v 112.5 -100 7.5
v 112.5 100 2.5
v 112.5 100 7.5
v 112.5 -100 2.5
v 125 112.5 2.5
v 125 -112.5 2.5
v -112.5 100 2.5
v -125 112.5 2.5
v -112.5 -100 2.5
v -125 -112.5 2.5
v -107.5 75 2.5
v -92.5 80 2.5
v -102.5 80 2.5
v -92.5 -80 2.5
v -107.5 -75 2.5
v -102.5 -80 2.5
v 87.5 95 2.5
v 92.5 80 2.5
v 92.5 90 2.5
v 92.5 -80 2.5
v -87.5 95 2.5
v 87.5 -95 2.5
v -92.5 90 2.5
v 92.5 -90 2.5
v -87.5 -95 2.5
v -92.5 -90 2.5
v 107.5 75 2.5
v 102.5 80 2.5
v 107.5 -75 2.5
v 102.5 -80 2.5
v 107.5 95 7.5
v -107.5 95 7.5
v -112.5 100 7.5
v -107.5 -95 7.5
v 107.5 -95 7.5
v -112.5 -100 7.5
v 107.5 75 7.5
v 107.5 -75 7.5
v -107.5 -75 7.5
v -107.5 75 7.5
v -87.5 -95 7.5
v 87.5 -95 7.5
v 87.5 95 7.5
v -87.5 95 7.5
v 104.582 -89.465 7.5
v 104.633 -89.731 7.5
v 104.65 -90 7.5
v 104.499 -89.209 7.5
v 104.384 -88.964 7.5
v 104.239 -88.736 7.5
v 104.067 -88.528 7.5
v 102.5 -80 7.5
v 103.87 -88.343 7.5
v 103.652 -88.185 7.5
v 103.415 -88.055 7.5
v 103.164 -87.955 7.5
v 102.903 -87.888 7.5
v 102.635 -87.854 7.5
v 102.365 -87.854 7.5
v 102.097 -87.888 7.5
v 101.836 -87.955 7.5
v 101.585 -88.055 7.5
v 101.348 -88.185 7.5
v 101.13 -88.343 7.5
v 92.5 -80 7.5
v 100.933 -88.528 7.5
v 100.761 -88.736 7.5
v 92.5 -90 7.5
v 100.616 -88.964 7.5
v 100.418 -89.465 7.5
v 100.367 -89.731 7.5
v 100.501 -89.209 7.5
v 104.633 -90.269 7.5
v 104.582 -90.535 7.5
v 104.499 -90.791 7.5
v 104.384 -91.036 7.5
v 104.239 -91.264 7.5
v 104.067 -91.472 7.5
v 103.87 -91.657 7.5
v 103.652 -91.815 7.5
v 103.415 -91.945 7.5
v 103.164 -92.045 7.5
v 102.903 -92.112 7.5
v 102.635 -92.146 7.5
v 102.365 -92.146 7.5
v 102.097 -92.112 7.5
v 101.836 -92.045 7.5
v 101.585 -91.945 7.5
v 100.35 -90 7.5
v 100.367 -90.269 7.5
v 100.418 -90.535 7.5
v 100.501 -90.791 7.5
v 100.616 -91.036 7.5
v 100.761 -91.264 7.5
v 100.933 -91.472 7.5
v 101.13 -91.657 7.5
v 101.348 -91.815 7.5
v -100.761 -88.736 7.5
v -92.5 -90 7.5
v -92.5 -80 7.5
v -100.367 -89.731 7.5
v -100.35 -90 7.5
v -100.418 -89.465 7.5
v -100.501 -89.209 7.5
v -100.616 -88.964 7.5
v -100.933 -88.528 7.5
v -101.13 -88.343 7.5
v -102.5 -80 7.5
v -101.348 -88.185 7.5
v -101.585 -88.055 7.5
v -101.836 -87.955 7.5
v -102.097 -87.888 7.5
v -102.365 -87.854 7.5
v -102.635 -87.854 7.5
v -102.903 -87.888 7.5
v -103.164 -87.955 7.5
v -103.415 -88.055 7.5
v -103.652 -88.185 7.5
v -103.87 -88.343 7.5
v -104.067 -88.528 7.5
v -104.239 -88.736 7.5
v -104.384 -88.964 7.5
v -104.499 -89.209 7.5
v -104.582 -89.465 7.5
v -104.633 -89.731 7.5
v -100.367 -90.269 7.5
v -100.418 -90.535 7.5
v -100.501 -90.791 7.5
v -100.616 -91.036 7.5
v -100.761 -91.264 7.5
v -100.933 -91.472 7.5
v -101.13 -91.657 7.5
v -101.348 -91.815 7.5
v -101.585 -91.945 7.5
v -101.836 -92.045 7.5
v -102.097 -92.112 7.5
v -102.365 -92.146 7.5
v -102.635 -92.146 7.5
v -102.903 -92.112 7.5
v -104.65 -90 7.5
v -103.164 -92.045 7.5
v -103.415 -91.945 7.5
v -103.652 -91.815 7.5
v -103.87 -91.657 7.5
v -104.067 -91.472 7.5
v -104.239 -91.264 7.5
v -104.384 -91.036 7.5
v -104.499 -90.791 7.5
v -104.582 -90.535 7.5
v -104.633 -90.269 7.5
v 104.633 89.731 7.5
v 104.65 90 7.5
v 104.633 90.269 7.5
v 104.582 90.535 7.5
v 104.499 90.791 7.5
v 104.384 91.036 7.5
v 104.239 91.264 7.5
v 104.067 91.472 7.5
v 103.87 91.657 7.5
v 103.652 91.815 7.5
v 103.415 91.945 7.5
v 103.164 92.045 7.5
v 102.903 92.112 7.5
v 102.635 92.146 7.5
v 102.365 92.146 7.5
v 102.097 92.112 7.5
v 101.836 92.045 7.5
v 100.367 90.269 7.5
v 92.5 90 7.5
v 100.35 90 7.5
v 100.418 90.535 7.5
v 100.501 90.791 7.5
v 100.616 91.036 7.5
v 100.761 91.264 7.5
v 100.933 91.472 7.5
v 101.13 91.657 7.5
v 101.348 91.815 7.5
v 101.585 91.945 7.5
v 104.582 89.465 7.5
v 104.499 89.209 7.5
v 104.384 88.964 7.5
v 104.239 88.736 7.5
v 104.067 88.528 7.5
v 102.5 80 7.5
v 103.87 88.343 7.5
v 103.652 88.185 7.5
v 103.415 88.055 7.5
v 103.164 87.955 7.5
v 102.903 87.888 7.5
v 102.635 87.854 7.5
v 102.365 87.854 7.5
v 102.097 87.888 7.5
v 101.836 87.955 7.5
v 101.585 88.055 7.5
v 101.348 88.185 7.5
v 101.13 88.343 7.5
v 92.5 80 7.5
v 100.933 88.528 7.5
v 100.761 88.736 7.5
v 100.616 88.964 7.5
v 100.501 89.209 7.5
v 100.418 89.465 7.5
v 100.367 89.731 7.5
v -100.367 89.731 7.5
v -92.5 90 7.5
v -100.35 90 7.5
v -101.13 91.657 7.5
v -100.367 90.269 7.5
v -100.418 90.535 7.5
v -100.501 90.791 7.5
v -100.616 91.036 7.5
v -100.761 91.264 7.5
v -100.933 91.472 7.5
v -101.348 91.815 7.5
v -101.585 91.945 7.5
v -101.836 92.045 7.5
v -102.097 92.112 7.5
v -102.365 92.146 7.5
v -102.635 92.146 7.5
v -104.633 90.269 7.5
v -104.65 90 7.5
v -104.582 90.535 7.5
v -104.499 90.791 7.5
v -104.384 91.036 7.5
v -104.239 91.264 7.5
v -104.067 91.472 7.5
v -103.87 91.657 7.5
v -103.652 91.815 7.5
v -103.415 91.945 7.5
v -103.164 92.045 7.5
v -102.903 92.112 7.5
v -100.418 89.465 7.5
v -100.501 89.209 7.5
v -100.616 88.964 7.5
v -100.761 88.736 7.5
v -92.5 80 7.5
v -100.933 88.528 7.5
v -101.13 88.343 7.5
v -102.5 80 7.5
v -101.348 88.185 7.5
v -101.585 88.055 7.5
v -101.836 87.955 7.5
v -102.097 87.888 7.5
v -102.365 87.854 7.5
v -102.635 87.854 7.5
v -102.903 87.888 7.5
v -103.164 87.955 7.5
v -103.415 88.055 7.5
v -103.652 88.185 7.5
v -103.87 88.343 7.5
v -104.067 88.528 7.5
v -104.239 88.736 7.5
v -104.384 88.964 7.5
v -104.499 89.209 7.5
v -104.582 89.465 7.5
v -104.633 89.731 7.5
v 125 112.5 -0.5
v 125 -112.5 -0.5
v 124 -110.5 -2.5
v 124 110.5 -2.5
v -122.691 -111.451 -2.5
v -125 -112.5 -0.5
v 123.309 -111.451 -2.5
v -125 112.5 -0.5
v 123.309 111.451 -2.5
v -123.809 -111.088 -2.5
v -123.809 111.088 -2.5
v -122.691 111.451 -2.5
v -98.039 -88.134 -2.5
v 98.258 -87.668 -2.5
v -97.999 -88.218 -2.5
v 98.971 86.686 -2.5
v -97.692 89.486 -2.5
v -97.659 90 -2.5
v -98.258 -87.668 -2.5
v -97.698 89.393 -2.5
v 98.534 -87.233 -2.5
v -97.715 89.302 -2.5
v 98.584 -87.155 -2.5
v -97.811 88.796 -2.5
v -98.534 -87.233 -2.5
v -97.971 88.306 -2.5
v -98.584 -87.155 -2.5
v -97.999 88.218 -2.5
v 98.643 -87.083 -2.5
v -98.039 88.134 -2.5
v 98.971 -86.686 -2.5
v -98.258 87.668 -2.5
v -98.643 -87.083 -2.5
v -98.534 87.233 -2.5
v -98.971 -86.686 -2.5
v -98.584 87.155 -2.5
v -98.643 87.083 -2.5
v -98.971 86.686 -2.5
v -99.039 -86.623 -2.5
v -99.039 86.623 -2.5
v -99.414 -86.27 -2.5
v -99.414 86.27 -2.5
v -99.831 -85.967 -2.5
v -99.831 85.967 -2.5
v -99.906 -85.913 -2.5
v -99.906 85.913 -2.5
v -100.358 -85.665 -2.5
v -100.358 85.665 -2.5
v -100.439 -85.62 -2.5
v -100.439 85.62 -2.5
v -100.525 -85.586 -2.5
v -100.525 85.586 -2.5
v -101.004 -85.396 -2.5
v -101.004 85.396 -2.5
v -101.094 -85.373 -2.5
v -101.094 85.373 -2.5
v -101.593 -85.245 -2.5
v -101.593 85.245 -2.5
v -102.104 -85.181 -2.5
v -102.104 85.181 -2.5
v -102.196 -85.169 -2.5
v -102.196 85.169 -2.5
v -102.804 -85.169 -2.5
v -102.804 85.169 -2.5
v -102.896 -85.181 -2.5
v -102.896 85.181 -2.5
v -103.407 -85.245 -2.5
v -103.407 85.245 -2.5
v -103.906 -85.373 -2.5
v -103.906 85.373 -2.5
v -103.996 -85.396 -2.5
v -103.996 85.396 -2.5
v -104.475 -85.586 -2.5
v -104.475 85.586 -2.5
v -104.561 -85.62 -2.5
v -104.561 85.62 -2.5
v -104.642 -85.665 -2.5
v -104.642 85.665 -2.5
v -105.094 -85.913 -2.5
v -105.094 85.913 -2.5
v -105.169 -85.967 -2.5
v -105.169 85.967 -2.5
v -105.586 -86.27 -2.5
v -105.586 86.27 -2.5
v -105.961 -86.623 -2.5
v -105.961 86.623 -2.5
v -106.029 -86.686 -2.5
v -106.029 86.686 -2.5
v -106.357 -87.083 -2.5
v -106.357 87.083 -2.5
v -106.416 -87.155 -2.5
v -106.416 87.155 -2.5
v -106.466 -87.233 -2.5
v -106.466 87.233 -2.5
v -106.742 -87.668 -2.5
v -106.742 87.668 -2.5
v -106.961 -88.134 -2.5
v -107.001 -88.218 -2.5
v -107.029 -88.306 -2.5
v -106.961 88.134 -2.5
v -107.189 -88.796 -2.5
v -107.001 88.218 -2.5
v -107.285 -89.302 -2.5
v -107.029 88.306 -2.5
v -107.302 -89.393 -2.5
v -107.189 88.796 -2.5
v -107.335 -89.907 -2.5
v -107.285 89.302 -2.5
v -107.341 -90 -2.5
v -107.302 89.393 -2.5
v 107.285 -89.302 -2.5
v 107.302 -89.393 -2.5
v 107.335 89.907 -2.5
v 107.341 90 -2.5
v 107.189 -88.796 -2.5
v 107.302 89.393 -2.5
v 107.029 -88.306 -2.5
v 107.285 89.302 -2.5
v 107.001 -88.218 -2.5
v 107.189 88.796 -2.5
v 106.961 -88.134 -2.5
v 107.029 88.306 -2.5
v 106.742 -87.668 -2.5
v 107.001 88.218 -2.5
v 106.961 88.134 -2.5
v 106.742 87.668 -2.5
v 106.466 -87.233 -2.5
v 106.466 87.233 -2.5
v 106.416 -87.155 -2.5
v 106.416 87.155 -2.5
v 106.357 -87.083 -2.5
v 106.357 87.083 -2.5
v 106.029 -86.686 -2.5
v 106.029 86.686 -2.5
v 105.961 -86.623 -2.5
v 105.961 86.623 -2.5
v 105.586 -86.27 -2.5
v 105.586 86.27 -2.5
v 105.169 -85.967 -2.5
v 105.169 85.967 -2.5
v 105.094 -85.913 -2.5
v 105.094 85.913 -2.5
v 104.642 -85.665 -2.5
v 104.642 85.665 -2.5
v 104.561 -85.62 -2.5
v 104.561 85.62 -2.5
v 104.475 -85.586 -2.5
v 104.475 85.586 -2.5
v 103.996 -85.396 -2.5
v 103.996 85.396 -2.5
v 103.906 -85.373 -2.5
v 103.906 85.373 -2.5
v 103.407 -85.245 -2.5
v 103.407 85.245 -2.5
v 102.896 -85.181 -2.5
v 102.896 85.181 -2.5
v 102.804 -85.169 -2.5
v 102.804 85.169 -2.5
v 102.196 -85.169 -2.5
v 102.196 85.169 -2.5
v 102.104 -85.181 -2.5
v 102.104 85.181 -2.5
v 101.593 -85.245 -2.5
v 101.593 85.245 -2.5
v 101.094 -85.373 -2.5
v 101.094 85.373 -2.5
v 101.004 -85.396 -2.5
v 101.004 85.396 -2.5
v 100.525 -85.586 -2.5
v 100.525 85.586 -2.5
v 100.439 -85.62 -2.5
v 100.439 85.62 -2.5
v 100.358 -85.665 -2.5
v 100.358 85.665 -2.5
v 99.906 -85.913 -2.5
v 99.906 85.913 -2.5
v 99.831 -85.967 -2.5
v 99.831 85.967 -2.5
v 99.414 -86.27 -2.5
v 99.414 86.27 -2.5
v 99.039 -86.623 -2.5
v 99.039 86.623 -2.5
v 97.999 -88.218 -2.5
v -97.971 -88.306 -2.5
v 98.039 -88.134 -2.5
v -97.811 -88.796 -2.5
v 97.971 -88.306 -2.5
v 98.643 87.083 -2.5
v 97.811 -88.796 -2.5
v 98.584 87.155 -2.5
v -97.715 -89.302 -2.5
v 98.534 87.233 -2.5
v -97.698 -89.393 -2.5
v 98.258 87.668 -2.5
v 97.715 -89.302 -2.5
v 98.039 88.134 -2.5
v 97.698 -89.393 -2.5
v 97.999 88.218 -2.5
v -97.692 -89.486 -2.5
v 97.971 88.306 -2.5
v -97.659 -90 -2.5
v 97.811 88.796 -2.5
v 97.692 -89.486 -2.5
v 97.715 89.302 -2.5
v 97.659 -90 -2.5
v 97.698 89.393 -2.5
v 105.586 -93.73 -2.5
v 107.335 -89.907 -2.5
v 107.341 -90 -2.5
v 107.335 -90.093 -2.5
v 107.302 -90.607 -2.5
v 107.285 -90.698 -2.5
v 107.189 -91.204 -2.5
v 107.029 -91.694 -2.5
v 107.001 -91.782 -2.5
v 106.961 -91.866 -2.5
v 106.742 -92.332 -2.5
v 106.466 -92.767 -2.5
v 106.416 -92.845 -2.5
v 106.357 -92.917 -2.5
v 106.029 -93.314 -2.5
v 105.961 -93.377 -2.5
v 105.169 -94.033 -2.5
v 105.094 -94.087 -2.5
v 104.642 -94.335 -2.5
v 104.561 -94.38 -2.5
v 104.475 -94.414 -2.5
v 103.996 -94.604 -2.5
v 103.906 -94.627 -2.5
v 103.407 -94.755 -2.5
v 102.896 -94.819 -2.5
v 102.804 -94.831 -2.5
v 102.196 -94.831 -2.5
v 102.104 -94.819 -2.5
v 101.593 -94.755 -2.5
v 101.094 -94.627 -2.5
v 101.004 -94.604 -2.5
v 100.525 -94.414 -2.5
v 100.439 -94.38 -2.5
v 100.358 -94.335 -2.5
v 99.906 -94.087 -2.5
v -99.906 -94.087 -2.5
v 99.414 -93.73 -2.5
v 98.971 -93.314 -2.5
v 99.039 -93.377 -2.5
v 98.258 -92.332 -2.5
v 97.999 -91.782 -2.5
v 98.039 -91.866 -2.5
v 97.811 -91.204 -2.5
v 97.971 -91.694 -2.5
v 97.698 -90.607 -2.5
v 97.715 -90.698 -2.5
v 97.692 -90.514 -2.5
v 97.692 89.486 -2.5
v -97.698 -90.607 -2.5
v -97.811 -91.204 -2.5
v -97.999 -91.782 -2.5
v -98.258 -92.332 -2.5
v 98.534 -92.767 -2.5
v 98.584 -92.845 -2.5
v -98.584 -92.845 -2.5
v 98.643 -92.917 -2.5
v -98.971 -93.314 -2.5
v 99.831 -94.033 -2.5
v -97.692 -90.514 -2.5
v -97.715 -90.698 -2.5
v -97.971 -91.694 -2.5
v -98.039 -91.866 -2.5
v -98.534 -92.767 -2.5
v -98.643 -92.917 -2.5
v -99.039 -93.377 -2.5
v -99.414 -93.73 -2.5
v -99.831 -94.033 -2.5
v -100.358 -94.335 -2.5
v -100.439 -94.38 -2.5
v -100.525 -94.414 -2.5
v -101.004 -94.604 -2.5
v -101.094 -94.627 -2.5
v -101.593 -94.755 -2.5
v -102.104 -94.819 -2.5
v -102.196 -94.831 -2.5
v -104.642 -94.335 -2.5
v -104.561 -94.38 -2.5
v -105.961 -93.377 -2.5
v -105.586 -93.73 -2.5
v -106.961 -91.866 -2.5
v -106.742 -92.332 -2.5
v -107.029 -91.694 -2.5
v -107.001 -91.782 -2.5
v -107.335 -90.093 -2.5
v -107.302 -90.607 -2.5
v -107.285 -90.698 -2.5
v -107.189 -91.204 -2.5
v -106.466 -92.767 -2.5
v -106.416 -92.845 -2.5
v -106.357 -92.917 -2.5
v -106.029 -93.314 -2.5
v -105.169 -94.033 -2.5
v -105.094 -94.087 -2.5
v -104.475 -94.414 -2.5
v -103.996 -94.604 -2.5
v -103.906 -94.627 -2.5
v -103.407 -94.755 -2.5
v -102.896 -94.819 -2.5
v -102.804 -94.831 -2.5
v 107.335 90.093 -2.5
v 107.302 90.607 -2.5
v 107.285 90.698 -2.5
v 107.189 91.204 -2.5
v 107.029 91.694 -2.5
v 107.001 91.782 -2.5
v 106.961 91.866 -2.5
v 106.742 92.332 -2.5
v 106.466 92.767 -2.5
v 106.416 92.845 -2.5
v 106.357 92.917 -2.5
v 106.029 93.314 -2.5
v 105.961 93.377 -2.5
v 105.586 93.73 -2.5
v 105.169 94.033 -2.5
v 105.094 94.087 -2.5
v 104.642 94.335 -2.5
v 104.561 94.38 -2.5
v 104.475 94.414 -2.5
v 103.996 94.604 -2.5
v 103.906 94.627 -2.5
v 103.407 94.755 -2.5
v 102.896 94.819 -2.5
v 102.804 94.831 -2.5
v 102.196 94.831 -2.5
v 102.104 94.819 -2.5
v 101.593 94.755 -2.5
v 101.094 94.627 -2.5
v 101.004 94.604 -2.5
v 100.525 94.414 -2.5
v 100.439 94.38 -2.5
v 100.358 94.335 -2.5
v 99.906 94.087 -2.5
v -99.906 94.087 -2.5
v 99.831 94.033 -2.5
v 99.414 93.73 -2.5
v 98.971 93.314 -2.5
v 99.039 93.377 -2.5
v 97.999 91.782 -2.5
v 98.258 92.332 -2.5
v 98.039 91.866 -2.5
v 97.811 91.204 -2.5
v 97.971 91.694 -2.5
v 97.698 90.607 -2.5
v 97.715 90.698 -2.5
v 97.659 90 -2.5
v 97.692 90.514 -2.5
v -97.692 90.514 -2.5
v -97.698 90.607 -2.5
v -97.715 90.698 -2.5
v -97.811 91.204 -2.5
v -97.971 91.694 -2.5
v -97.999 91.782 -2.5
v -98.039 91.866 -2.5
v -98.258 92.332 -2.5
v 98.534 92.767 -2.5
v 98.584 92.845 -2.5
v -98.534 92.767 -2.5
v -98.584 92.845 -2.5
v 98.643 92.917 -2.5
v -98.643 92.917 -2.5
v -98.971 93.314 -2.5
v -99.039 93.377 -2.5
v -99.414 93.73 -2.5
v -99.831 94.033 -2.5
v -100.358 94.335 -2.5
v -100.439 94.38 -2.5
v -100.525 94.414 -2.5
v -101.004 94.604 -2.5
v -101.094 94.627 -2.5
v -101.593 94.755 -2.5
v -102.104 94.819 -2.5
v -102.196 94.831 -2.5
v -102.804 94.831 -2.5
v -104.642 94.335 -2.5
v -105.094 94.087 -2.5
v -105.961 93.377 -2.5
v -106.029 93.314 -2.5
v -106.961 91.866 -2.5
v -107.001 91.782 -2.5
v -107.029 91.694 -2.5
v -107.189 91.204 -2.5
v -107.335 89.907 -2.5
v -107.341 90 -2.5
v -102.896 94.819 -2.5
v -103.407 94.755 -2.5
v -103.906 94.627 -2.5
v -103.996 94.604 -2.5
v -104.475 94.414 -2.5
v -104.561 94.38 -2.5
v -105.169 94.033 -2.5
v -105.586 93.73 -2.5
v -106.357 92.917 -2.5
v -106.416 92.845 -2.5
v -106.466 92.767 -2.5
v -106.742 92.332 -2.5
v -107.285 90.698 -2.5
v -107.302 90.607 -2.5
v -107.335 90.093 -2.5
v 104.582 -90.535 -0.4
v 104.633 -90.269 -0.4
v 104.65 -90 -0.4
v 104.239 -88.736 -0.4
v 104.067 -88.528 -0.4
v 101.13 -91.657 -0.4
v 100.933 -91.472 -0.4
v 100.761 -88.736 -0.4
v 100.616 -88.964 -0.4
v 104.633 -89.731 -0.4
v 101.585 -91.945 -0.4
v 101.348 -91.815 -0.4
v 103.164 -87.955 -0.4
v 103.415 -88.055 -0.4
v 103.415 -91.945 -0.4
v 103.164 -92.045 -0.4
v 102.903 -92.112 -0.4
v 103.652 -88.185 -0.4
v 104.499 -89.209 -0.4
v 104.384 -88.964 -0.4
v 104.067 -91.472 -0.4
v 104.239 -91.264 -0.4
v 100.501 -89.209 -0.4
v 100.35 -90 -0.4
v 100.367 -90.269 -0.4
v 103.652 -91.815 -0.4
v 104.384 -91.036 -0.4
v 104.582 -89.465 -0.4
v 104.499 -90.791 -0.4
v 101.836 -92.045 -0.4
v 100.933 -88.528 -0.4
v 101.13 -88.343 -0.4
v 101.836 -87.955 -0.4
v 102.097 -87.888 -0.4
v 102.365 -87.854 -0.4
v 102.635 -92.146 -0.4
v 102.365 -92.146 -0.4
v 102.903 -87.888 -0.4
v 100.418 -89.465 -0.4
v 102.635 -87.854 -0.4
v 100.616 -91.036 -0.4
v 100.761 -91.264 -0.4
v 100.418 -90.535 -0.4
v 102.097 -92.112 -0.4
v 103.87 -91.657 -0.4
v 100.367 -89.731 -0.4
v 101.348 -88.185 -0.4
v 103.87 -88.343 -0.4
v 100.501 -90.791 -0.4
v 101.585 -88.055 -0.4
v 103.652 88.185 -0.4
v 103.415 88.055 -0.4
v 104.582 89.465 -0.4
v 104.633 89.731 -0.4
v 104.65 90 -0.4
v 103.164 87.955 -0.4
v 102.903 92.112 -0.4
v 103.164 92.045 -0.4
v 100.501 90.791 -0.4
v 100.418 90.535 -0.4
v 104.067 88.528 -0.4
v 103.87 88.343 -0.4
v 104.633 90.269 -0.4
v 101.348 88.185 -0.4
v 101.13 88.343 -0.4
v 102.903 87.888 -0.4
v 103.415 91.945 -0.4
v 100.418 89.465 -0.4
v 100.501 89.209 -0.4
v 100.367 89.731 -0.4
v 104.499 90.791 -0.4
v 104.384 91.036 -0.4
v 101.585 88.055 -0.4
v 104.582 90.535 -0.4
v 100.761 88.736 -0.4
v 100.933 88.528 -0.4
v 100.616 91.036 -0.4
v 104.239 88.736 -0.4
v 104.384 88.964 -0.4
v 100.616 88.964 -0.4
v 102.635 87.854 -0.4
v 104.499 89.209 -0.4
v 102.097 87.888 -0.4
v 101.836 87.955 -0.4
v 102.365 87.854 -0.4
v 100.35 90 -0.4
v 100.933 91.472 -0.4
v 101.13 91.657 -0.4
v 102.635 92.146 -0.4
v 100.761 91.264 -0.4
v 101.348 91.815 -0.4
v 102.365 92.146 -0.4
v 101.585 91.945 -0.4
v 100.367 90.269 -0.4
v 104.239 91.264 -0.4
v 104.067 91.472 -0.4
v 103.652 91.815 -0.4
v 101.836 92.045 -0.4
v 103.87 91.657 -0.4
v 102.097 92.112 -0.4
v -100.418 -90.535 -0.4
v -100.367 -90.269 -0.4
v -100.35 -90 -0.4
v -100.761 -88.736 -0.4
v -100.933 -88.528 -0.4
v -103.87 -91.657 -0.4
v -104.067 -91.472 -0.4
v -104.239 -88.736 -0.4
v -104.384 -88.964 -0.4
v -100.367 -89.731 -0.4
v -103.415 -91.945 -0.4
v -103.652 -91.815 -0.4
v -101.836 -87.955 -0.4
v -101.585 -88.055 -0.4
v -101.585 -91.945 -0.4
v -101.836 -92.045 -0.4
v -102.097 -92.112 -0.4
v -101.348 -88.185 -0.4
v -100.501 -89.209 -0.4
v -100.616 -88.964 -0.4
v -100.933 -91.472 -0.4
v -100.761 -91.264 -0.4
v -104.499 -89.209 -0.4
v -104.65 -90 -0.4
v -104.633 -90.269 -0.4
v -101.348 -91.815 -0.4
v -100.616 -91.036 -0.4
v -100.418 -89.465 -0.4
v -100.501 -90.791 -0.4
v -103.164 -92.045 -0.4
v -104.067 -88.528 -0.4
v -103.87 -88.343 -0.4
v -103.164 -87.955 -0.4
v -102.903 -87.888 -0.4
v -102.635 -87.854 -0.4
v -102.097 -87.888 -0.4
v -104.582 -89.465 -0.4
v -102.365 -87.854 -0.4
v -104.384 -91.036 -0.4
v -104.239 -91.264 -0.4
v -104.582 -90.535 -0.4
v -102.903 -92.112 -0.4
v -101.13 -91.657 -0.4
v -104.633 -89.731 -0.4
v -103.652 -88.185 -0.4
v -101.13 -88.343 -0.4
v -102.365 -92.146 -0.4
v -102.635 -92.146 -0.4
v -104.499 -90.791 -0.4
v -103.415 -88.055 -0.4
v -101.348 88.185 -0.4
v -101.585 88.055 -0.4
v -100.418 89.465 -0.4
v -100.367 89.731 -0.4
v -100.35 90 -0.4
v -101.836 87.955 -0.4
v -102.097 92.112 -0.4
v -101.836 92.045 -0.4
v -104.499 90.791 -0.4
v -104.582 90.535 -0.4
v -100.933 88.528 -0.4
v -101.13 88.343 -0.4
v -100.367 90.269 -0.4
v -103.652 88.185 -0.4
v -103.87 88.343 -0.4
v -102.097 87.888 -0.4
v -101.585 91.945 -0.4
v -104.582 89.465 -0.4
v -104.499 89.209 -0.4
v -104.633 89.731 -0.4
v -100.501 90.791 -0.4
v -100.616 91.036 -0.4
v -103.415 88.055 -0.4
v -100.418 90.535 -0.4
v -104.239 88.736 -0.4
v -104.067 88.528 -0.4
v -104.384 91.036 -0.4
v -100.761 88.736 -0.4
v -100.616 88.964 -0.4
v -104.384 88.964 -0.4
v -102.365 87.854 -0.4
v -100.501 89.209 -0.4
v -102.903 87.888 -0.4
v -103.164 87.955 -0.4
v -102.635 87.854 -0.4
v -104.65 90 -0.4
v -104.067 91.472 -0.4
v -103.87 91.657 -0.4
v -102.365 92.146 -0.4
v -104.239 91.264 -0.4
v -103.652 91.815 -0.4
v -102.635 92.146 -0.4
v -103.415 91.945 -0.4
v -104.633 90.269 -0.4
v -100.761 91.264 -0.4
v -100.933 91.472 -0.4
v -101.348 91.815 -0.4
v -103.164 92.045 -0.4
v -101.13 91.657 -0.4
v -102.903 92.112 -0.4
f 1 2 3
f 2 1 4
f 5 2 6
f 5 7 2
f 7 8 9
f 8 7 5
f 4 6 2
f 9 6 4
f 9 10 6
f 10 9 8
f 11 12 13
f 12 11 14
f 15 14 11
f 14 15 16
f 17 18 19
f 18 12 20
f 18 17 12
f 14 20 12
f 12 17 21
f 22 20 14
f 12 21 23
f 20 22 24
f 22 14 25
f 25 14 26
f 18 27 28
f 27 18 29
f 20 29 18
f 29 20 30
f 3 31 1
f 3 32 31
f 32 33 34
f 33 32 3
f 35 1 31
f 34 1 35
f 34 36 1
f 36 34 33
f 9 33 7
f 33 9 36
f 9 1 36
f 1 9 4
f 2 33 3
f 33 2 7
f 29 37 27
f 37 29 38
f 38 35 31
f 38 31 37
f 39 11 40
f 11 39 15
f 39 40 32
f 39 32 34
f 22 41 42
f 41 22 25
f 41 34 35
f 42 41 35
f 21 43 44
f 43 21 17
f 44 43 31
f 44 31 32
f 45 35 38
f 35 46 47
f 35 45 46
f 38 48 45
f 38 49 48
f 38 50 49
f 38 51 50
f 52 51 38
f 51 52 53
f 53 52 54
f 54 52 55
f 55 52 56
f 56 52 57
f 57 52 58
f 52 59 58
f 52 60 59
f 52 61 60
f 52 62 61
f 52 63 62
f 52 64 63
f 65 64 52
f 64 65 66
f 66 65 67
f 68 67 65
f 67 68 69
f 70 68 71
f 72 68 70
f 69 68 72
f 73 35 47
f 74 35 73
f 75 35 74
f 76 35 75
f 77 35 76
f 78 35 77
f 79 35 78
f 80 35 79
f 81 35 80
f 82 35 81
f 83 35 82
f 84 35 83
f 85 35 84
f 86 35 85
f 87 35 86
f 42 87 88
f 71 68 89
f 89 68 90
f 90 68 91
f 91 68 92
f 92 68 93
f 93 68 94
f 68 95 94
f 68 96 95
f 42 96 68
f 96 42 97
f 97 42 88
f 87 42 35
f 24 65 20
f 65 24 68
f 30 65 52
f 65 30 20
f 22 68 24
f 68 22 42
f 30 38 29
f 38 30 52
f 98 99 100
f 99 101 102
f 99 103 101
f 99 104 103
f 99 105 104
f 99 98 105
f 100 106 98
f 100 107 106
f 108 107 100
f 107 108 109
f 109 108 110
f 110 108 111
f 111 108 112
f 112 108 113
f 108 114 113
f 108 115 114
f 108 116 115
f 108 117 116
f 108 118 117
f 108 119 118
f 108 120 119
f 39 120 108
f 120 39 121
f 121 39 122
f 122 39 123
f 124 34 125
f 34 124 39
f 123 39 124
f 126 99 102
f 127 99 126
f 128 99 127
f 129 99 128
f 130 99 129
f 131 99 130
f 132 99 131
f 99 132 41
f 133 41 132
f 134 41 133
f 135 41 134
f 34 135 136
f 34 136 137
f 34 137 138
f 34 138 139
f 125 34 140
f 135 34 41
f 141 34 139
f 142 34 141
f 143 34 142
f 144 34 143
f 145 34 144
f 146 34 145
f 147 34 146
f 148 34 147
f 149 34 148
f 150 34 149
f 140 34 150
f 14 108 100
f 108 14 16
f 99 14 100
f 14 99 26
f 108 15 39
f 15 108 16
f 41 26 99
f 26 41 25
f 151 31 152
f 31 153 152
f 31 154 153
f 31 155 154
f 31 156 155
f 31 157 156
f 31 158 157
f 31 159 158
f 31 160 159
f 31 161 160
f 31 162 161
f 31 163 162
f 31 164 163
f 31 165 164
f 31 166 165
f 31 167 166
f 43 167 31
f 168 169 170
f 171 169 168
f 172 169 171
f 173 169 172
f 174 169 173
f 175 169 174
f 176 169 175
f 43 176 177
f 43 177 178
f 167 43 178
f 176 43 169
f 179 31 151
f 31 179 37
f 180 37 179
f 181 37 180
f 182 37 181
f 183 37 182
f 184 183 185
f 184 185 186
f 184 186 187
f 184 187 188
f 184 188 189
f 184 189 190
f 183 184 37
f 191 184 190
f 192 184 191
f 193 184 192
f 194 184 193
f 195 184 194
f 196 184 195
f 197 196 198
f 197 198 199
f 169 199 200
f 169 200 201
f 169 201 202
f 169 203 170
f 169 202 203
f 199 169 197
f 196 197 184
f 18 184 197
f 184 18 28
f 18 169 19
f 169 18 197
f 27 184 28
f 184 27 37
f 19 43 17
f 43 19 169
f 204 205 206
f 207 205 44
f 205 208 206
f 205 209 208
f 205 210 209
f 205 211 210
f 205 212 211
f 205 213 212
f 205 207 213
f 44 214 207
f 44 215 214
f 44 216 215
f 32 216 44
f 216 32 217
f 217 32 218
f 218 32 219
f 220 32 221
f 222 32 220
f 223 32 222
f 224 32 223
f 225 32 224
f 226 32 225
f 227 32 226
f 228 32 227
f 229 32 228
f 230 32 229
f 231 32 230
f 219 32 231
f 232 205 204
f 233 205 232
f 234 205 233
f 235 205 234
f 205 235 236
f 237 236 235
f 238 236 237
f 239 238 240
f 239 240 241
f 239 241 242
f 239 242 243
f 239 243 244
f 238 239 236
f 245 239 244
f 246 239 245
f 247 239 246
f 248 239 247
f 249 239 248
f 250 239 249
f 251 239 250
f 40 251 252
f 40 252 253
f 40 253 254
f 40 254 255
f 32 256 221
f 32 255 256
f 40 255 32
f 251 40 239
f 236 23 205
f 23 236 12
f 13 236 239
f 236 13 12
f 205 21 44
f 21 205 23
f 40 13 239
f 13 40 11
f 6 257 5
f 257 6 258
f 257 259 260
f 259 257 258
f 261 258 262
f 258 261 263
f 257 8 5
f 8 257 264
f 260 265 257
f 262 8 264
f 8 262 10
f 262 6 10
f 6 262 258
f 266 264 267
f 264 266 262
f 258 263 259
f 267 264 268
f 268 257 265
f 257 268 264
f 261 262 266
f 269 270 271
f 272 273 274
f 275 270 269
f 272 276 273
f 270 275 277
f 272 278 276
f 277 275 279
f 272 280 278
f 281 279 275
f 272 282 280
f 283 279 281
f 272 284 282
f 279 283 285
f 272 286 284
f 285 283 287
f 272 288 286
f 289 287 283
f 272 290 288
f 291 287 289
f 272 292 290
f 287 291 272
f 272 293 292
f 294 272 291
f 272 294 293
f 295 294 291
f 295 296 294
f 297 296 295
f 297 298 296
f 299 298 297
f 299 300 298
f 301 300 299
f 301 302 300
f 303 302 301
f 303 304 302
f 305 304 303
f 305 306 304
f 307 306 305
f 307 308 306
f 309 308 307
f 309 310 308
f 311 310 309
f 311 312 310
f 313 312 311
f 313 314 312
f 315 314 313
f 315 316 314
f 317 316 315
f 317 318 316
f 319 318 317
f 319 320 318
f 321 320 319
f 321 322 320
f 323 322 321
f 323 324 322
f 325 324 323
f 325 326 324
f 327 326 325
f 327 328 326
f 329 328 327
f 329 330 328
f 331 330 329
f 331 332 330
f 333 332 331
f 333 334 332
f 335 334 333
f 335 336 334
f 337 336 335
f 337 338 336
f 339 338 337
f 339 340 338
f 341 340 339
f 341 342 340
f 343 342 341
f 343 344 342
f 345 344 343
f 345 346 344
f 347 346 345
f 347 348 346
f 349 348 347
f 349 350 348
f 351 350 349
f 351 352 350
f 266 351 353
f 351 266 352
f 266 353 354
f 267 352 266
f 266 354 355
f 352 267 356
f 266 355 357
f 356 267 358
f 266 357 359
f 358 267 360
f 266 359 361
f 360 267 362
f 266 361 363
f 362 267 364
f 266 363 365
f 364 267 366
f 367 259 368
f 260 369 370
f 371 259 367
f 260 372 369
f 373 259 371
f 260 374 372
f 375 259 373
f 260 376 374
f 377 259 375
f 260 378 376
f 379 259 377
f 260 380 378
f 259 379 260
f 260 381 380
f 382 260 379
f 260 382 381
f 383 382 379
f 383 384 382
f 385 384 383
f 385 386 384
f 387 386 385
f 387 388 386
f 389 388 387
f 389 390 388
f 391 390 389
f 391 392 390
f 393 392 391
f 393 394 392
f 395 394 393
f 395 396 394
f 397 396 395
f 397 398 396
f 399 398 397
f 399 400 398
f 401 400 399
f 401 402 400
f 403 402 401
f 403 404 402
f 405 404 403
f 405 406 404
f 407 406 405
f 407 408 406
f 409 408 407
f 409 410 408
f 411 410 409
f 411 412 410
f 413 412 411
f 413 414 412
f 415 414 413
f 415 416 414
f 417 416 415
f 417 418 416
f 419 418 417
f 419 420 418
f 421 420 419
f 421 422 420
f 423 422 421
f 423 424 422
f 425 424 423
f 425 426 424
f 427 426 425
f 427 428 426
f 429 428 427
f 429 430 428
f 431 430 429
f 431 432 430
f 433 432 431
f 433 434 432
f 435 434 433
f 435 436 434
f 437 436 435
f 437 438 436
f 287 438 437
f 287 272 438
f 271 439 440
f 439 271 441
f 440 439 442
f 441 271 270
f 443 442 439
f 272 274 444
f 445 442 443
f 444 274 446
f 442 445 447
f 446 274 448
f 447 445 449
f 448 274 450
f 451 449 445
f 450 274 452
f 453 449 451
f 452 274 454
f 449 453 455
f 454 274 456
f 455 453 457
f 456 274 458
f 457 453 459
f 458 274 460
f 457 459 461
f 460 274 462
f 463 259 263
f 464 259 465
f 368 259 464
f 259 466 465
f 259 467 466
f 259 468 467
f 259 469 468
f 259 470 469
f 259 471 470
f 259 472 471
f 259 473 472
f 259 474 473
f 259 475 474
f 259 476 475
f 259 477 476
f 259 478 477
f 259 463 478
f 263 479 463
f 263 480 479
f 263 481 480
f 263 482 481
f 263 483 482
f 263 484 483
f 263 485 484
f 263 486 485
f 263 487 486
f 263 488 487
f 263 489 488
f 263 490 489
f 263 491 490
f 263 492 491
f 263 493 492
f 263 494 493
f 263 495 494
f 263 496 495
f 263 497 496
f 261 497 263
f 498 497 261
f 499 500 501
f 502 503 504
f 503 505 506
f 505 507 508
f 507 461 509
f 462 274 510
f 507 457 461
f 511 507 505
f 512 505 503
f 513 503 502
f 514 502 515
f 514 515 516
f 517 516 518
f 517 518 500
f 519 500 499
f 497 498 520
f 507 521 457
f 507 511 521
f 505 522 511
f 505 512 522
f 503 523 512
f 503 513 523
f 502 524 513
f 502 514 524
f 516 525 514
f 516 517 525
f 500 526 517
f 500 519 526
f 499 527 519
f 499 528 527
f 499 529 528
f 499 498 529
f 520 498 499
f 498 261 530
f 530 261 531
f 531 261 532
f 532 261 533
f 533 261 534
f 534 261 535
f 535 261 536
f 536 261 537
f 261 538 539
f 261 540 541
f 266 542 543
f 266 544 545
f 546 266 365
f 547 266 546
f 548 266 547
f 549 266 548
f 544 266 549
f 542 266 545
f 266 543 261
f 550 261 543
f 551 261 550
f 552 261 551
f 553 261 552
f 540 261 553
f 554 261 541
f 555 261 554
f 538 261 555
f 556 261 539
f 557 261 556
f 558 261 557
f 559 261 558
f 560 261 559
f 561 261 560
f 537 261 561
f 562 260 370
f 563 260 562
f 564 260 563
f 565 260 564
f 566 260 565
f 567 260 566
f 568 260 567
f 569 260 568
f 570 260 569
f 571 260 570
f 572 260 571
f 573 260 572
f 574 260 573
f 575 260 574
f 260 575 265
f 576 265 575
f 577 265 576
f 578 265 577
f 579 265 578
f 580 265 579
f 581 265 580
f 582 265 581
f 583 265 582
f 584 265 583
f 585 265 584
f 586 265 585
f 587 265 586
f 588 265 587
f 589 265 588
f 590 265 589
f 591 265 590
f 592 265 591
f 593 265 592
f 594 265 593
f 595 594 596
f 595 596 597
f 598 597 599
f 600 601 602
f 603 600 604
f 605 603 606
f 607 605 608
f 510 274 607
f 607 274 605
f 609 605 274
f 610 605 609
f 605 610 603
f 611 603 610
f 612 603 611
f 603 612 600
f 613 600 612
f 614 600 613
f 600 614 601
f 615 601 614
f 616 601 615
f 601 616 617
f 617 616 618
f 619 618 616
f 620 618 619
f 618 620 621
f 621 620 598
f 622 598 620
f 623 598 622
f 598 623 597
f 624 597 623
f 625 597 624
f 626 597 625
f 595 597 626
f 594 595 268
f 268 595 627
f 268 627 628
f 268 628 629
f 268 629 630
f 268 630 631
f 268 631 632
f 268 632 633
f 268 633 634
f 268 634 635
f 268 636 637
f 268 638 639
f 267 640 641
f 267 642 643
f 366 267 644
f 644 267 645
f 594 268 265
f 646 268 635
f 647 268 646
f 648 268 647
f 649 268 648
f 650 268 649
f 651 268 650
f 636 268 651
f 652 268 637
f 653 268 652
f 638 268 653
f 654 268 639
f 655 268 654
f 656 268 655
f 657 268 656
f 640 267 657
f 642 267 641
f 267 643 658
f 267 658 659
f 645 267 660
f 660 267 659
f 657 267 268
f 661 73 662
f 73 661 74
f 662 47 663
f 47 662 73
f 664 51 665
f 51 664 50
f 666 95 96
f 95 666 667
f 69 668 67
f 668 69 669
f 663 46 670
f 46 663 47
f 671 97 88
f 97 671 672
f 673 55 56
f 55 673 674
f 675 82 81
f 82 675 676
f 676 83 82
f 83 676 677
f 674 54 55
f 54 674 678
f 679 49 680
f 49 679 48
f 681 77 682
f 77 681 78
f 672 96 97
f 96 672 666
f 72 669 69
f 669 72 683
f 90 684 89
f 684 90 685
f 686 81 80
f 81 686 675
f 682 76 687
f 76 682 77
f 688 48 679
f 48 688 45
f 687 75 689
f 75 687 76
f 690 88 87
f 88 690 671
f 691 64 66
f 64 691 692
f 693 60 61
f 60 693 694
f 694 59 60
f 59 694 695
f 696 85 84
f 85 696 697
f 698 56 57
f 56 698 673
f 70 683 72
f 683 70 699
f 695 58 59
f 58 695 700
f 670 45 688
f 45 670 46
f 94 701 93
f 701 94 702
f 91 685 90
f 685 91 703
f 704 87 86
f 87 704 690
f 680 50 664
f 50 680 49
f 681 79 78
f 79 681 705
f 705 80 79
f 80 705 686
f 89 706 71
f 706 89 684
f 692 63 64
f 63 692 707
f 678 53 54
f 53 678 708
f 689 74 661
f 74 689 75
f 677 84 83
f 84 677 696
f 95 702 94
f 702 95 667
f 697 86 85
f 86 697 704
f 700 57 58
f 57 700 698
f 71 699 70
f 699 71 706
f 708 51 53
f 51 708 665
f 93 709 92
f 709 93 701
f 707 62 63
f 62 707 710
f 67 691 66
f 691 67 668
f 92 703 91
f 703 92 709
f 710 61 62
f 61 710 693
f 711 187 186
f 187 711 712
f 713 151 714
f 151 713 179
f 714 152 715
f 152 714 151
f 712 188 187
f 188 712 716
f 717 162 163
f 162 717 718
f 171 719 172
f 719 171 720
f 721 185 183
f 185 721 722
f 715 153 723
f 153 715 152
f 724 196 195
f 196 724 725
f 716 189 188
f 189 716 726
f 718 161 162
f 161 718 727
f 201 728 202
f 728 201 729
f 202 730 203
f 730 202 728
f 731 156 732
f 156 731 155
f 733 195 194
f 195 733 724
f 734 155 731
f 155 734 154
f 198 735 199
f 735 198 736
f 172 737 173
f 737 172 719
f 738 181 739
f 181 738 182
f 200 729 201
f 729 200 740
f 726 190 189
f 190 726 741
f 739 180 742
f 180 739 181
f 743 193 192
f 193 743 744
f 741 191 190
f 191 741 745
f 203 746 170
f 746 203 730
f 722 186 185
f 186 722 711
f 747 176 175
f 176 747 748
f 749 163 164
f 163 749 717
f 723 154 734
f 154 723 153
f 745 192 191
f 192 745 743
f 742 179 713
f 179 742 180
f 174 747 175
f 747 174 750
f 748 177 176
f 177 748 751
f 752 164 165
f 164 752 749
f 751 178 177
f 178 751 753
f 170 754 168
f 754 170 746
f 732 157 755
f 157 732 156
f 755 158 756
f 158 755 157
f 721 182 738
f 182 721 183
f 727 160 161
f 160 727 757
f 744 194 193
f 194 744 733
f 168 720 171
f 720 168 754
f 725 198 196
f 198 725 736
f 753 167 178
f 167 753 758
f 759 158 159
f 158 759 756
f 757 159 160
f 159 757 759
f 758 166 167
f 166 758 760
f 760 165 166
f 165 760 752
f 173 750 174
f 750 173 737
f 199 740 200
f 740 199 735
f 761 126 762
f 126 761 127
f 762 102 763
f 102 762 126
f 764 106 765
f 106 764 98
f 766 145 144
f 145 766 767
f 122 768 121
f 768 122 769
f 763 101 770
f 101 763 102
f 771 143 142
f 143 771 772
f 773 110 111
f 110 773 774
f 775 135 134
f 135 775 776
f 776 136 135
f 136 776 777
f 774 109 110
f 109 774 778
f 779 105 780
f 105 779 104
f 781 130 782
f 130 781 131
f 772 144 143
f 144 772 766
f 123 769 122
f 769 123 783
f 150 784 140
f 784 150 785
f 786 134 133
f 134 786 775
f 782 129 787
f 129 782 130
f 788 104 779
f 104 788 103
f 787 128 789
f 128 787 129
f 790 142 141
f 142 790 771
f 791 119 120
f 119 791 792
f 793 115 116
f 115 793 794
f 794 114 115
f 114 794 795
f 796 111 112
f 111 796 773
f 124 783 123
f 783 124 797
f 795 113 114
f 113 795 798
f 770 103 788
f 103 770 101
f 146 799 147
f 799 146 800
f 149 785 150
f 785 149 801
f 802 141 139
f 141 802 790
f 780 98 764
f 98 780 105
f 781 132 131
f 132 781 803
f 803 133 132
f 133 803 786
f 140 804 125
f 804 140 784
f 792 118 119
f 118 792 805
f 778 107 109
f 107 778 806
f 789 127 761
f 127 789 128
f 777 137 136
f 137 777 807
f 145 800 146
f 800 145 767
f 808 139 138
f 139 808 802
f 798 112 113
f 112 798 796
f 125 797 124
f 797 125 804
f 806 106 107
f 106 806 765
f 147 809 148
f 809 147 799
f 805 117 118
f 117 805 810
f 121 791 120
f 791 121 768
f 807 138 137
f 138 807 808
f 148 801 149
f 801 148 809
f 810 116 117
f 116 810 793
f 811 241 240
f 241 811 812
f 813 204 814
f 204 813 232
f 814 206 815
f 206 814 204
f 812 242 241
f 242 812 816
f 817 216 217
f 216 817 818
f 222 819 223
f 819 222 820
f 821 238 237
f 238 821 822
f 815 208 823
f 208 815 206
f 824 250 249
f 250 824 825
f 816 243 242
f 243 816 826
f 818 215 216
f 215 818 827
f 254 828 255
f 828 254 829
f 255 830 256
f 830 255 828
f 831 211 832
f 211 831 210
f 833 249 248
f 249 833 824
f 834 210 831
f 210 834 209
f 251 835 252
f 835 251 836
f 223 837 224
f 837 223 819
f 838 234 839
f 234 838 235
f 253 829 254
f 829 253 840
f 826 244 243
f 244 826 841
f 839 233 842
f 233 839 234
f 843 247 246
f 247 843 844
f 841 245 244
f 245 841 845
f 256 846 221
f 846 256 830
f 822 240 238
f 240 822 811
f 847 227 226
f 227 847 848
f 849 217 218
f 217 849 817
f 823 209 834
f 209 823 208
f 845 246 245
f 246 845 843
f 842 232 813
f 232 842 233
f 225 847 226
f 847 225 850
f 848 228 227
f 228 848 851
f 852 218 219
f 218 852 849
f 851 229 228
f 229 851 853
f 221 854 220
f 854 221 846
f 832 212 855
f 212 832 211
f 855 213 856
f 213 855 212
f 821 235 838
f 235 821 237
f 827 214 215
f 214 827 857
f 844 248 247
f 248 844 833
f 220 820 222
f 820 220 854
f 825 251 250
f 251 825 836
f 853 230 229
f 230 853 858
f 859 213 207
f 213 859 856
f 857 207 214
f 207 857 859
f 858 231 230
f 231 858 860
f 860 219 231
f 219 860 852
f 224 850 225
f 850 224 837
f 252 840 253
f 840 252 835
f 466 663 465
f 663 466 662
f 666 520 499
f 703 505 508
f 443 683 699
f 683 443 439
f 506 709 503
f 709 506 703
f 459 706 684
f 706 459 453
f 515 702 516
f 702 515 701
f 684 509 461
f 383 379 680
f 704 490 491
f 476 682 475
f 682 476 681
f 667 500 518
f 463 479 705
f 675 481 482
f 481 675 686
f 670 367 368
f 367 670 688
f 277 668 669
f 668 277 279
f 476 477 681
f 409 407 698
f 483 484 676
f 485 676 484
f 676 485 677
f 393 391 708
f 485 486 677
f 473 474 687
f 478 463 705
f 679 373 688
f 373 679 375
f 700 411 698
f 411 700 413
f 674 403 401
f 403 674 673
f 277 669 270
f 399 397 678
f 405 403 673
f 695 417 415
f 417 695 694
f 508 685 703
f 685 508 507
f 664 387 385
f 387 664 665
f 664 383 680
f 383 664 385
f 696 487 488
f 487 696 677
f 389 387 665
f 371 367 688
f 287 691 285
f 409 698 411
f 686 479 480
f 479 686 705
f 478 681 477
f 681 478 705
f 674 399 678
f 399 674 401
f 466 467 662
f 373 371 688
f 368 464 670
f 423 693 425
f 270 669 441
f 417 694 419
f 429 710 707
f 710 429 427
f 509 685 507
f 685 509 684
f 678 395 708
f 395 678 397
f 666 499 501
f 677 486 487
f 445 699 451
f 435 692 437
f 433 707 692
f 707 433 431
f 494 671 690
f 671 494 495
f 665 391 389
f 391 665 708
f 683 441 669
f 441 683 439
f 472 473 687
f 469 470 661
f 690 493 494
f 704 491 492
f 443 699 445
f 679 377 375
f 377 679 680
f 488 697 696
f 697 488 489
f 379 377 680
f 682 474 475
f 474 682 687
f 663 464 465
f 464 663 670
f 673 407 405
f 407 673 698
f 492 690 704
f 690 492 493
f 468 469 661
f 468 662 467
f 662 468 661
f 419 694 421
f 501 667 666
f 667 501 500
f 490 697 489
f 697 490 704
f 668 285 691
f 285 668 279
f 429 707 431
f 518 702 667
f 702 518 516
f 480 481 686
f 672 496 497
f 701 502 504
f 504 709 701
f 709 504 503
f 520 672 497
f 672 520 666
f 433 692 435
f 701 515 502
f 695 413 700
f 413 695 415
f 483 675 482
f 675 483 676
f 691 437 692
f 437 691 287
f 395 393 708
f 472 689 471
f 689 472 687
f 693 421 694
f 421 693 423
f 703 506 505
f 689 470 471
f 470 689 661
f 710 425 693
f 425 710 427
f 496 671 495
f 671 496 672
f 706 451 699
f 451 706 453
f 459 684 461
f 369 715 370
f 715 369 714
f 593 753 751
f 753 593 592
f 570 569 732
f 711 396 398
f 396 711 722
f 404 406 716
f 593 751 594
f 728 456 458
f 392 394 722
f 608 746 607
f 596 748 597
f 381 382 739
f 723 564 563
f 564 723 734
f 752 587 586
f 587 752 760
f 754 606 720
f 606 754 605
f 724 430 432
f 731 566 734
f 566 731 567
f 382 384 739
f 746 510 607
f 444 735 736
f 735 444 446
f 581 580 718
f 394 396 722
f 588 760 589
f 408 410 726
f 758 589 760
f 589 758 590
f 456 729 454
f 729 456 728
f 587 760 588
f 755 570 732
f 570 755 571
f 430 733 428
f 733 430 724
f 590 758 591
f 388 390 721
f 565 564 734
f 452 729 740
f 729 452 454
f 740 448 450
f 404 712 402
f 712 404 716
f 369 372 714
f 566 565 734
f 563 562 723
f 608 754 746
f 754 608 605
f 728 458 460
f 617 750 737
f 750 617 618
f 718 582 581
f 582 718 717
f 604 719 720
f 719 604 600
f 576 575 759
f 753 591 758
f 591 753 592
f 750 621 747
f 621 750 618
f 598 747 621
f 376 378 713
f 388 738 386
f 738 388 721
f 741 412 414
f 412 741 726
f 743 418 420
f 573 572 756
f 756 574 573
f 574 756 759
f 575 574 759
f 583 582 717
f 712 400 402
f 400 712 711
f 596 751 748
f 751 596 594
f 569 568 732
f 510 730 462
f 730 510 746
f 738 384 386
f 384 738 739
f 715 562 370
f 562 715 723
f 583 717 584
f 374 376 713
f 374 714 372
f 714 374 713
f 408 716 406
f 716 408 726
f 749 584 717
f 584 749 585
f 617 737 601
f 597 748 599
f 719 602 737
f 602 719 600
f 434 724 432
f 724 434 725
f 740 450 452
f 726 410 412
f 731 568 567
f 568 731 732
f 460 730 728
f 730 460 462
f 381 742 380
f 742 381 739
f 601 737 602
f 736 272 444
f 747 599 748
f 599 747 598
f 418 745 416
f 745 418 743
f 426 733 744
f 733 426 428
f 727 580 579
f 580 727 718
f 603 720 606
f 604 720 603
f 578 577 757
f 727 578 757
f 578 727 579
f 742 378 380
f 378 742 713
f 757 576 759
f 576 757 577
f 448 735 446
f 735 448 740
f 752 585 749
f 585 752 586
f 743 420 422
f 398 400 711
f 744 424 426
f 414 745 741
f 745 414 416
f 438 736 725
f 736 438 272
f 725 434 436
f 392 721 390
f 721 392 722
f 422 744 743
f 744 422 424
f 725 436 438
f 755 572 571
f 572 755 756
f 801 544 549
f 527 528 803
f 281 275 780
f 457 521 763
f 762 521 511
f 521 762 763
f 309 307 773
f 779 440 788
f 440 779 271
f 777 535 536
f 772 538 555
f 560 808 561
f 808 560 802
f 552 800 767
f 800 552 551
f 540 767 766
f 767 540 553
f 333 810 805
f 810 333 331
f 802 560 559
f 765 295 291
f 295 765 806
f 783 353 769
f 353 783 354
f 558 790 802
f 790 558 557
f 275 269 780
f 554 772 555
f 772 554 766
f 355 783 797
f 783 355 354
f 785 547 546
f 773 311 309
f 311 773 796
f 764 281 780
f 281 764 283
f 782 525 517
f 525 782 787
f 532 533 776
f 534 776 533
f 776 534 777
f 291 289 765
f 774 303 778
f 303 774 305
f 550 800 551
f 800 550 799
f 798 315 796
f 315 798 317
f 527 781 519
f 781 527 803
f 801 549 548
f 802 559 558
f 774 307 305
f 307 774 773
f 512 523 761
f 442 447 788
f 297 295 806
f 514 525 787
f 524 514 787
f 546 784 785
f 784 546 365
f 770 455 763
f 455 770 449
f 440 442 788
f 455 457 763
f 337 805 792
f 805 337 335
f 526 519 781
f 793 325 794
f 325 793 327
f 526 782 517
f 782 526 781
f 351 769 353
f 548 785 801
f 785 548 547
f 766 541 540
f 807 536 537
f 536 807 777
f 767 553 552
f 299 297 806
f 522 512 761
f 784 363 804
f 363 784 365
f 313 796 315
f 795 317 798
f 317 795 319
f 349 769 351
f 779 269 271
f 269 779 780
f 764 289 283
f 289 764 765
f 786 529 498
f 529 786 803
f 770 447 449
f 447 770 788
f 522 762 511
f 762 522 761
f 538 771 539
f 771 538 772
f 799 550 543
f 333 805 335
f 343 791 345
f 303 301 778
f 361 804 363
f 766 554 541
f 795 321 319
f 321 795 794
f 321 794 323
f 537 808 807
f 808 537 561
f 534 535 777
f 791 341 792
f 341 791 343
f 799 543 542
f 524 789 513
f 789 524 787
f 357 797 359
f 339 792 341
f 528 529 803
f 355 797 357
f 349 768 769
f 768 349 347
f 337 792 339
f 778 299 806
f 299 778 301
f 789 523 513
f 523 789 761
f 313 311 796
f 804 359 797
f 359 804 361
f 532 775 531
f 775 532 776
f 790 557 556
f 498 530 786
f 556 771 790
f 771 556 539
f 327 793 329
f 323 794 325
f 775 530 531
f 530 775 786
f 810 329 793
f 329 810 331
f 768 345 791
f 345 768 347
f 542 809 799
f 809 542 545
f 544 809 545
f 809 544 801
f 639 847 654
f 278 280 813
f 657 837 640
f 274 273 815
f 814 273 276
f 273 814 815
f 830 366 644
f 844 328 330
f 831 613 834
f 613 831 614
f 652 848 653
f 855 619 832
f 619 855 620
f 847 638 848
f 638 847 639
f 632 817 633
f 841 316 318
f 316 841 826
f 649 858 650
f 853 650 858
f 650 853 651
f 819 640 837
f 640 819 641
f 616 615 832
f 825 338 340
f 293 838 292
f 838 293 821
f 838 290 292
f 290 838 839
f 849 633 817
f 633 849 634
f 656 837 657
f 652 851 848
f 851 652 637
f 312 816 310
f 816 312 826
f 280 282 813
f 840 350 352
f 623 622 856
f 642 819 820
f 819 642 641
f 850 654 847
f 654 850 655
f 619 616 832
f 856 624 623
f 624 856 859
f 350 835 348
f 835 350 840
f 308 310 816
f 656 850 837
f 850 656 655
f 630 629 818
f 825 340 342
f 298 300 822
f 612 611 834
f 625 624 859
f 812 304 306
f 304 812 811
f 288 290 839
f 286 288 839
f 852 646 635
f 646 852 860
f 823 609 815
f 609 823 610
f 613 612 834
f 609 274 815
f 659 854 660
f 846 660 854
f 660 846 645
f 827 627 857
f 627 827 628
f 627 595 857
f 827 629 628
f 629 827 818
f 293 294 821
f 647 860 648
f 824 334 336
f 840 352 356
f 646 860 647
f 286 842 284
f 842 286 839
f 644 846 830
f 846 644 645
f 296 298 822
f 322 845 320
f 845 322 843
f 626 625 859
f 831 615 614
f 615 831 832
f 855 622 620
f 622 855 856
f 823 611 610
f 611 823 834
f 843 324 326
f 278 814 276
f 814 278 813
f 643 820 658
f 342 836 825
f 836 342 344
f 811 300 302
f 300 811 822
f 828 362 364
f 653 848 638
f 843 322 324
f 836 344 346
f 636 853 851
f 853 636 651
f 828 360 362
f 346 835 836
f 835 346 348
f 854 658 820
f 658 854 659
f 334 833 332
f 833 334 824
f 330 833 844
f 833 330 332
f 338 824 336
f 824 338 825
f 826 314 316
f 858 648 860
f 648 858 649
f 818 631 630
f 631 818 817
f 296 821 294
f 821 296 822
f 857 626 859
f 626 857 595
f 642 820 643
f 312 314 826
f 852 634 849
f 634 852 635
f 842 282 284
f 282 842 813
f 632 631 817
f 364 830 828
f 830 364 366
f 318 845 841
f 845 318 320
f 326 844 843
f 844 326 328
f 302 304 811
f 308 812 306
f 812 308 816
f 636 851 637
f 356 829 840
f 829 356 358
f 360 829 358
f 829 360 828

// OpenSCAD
// file: parameters.scad
/*
 * SPDX-FileCopyrightText: © 2023 Brian S. Stephan <bss@incorporeal.org>
 * SPDX-License-Identifier: GPL-3.0-or-later
 */


// CONNECTION POINT SIZES


// adjustments
hole_tolerance = 0.15;

// M2
m2_screw_selftap_radius = 0.95;

// M3
m3_screw_selftap_radius = 1.3;

// M4
m4_bolt_radius = 2 + hole_tolerance;
m4_bolt_countersink_radius = 6.1 + hole_tolerance;
m4_bolt_hex_exterior_radius = 3.6 + hole_tolerance;

// M6
m6_bolt_radius = 3 + hole_tolerance;

// 24mm button
small_button_radius = 12 + hole_tolerance;

// 30mm button
big_button_radius = 15 + hole_tolerance;

// carve out space around buttons for screw-in nuts
// slagcoin has screw-in nut diameter at 36mm for 30mm buttons, 29.5 for 24mm buttons
// radius + value below should leave space for the nut and for fingers to grab the nut
button_radius_connector_space = 5;

// standard lever hole
lever_plate_hole = 12;

// neutrik D screw holes
neutrik_d_screw_radius = 1.6 + hole_tolerance;
neutrik_d_radius = 12 + hole_tolerance;


// ELEMENT DIMENSIONS


// JLF mount dimensions
lever_mount_x = 53;
lever_mount_y = 95;
lever_mount_z = 2;

// base frame box. reminder: inside top and bottom (including mounts) are chopped by panel_z for plates
frame_x = 233;
frame_y = 208;
frame_z = 57;

// depth of the "lip" of the frame that the top plate sets into/supports the overhang
frame_wall = 4;

// top plate, which can either be the whole plate ("inset") or the mounting frame for a plate that overhangs
panel_x = frame_x - (frame_wall * 2);
panel_y = frame_y - (frame_wall * 2);
panel_z = 5;

// some dimensions for frame pieces, useful in doing some intersections and chopping
frame_piece_x_x = frame_x - (frame_wall * 2);	// essentially panel_x, yes
frame_piece_y_y = frame_y;			// the whole y of the frame, yes

// degree to which the extended frame pieces stick out from the end of the frame
frame_extension_x = 25;
frame_extension_y = 25;

// this sinks the bottom and top of the frame inward a bit, and is used to math out two shapes
// when creating the frame box / overhang panel
frame_bevel_height = 1.25;
overhang_panel_bevel_height = 1;

frame_center_to_neutrik = 70;

// width of the column in the frame corners to support the hex bolt
frame_mount_column_width = 20;

// per neutrik (mm)
neutrik_panel_thickness = 3;

// inside the frame
inner_frame_z = frame_z - (panel_z * 2);

// "windowed" pieces chop out the inner wall of the frame as a separate piece in order
// to print it a different color/way/style. to improve friction fit, it is only the below
// value scale of the whole wall, so that the rest of the wall is retained on the outer
// piece, which helps clamp the two together (and helps the panels clamp it all)
inner_frame_z_decorative_scale = 0.95;

// how much the top plate x/y is expanded to overhang the frame
// note that this is relative to the top plate (so the wall is added back)
panel_overhang_amount = 8.5;
overhang_panel_x = panel_x + (frame_wall * 2) + (panel_overhang_amount * 2);
overhang_panel_y = panel_y + (frame_wall * 2) + (panel_overhang_amount * 2);

panel_to_frame_point_offset = 10;
panel_to_frame_point_x = (panel_x/2) - panel_to_frame_point_offset;
panel_to_frame_point_y = (panel_y/2) - panel_to_frame_point_offset;

// frame interior that supports the top plates
panel_support_width = 5;

// additional button radius for decorative panels, etc.
decorative_radius_scale = 1.75;
jumbo_decorative_radius_scale = 2;

// decorative wall cutout parameters
// thicker than the actual base wall to account for the longish pieces
wall_cutout_depth = frame_wall * 3;

// decorative slash parameters
slash_inner_displacement = 10;
slash_width = 15;
slash_height = frame_z-panel_z*3;

// dustwasher parameters
jlf_dustwasher_radius = 19;
jlf_shaft_inner_radius = 4.55;

lsx_nobi_dustwasher_radius = jlf_dustwasher_radius;
lsx_nobi_shaft_inner_radius = 5;

shaft_position_tolerance = 2;

// stand dimensions to display a stick
stand_x = 5;
stand_y = frame_z;
stand_z = 15;

// oled cutout stuff
ssd1306_x = 23;
ssd1306_y = 12;
ssd1306_z = 1;
adafruit_pid_326_oled_ssd1306_cutout_x = 30;
adafruit_pid_326_oled_ssd1306_cutout_y = 32;


// LAYOUTS


sega_2p_column_2_offset = 30.5;
sega_2p_column_3_offset = sega_2p_column_2_offset + 36;
sega_2p_column_4_offset = sega_2p_column_3_offset + 36;
sega_2p_column_5_offset = sega_2p_column_4_offset + 36;

// this offset is from the left edge of the panel
sega_2p_column_1_left_panel_edge_offset = 28.06;

dir_arc_30mm_column_2_offset = 33.8;
dir_arc_30mm_column_3_offset = dir_arc_30mm_column_2_offset + 34.8;
dir_arc_30mm_row_2_offset = 57.2;
dir_arc_30mm_row_3_offset = dir_arc_30mm_row_2_offset + 12.9;
dir_arc_w_30mm_row_4_offset = dir_arc_30mm_row_3_offset + 34.5;
// main file
/*
 * SPDX-FileCopyrightText: © 2023 Brian S. Stephan <bss@incorporeal.org>
 * SPDX-License-Identifier: GPL-3.0-or-later
 */

include <parameters.scad>
include <components.scad>

module bottom_panel_solo() {
	difference() {
		rotate([180, 0, 0]) base_panel_with_raised_overhang();
		rotate([180, 0, 0]) panel_holes();
	}
}

bottom_panel_solo();
